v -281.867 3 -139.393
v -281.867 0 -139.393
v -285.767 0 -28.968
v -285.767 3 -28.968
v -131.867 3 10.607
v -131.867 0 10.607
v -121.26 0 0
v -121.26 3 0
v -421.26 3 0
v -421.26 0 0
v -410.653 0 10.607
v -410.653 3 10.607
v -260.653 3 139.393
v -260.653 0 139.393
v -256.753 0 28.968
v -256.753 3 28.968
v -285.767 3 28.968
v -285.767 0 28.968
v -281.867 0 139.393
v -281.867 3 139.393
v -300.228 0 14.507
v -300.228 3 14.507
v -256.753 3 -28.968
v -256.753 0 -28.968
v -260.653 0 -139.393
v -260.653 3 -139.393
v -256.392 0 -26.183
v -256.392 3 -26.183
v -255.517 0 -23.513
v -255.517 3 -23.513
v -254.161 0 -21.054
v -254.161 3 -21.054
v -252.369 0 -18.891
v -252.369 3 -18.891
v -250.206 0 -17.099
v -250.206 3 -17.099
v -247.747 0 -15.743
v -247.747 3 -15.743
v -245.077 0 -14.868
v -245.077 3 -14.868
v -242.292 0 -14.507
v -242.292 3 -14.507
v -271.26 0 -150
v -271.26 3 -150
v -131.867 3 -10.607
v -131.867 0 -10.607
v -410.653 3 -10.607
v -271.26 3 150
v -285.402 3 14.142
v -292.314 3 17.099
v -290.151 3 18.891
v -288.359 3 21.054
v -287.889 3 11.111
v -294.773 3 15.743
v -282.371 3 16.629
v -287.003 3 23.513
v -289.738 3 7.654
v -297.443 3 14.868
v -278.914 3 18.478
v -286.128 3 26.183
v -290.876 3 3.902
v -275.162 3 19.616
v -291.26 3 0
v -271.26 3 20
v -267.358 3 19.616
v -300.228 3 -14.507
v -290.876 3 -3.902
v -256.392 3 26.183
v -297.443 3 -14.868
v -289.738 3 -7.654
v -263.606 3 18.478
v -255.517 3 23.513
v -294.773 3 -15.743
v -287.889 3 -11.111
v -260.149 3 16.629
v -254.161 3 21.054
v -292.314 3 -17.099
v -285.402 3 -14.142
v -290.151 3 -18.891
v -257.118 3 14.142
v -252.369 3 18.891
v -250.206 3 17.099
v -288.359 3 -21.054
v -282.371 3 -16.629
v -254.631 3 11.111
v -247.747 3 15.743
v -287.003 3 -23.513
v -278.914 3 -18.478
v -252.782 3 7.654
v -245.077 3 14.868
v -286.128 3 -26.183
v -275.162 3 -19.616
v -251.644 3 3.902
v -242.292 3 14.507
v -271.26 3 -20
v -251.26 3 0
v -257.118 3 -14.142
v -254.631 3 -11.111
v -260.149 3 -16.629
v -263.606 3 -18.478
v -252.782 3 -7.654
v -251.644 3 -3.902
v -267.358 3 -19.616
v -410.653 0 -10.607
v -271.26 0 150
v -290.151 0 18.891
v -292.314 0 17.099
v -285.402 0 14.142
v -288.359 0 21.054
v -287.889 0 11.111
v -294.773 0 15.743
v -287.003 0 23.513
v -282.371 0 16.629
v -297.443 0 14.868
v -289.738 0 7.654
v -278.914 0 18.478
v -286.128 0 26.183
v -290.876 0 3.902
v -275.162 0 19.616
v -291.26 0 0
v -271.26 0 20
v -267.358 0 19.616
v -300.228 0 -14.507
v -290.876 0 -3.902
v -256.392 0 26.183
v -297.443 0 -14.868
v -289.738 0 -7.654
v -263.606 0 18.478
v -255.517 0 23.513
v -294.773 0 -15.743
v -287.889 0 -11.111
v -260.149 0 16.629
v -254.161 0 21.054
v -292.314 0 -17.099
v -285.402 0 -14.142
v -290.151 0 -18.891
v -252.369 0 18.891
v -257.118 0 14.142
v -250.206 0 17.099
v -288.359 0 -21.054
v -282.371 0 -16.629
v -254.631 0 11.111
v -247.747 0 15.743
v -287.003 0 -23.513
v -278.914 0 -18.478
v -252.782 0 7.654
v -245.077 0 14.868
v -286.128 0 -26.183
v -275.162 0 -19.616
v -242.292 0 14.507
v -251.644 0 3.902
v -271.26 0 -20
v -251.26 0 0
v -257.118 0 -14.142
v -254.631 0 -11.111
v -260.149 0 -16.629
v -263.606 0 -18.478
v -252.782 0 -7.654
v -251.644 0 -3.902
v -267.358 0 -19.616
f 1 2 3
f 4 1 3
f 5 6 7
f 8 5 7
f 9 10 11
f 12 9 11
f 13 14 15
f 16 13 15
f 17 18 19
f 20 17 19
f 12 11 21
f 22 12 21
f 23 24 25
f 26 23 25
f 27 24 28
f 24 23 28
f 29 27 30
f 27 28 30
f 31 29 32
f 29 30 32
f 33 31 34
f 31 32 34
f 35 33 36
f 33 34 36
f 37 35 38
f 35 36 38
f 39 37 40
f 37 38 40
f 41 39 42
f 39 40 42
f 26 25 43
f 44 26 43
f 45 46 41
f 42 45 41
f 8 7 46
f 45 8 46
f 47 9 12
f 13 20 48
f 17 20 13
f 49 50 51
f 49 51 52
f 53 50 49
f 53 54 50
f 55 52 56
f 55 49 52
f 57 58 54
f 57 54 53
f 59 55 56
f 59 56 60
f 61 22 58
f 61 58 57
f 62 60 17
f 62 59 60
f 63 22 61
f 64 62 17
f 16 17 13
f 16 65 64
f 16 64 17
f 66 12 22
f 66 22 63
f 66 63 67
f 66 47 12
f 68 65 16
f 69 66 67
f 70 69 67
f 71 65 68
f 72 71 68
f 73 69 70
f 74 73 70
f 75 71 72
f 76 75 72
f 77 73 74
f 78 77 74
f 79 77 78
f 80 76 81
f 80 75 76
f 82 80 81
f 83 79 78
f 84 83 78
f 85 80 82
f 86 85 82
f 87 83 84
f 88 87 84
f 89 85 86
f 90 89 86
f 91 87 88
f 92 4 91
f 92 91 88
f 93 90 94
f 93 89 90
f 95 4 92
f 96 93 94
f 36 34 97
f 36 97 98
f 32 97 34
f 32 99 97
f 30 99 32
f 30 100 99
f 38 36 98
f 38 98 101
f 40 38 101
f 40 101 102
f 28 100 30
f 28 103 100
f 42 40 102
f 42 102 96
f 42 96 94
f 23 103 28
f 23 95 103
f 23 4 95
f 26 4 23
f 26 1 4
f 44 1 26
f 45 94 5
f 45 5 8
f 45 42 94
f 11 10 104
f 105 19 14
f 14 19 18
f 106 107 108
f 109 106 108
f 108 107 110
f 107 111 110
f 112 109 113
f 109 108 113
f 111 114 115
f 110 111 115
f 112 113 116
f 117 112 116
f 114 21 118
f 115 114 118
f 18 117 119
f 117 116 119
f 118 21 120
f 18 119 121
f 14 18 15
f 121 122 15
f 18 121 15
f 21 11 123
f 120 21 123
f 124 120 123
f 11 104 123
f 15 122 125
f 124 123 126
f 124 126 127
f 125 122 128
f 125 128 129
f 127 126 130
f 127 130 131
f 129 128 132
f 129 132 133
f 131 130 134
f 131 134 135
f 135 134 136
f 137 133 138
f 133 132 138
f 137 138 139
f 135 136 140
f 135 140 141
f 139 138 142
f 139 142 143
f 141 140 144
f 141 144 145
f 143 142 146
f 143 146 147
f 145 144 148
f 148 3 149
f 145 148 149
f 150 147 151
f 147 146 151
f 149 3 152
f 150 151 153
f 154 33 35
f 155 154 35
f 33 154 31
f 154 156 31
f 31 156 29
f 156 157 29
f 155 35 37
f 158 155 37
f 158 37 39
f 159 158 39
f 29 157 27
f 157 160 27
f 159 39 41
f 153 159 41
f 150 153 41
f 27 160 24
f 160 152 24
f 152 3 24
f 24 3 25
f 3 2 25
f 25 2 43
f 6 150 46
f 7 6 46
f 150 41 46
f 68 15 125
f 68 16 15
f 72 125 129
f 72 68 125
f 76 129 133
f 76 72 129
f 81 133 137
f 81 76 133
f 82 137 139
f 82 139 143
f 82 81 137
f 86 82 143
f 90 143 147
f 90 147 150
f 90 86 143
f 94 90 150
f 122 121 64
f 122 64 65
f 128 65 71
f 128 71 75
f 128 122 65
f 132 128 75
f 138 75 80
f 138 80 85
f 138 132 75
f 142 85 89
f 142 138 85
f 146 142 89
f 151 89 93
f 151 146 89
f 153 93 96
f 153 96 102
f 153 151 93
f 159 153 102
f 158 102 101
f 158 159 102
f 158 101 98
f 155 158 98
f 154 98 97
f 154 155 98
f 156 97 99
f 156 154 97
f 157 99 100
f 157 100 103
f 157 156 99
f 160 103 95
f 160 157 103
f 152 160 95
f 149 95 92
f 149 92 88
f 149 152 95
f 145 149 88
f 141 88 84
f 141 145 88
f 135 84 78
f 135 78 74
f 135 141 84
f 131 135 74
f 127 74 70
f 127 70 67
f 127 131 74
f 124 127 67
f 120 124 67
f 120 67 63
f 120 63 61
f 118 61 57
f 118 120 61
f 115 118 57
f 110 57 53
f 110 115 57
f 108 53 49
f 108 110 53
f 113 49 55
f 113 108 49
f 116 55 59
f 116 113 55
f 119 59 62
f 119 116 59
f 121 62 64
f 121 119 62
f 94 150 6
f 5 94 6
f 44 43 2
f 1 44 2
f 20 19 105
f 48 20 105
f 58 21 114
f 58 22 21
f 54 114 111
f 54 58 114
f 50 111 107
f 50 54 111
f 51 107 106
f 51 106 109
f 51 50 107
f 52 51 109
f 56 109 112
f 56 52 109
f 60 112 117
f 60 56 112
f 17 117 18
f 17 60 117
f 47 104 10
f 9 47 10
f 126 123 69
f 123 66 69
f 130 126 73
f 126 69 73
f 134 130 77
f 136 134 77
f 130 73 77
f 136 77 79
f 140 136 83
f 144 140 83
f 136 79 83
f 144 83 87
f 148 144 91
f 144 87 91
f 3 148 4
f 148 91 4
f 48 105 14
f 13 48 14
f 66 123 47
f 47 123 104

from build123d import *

# Parameters (mm, degrees)
SKETCH1_R           = 20
BOSS_EXTRUDE1_DEPTH = 3
FILLET1_R           = 15


with BuildPart() as part:
    # Sketch1 → Boss-Extrude1 (new body)
    with BuildSketch(Plane(origin=(0, 0, 0), x_dir=(1, 0, 0), z_dir=(0, 1, 0))):
        Polygon((-286.26, 15), (-410.653398282, 10.606601718), (-421.26, 0), (-410.653398282, -10.606601718), (-286.26, -15), (-281.866601718, -139.393398282), (-271.26, -150), (-260.653398282, -139.393398282), (-256.26, -15), (-131.866601718, -10.606601718), (-121.26, 0), (-131.866601718, 10.606601718), (-256.26, 15), (-260.653398282, 139.393398282), (-271.26, 150), (-281.866601718, 139.393398282), align=None)
        with Locations(Location((-271.26, 0, 0), (0, 0, 270))):
            Circle(SKETCH1_R, mode=Mode.SUBTRACT)
    extrude(amount=BOSS_EXTRUDE1_DEPTH)

    # Fillet1
    fillet1_edges = [part.edges().sort_by_distance(p)[0] for p in [
        (-256.26, 1.5, -15),
        (-256.26, 1.5, 15),
        (-286.26, 1.5, 15),
        (-286.26, 1.5, -15),
    ]]
    fillet(fillet1_edges, radius=FILLET1_R)


solid = part.part
